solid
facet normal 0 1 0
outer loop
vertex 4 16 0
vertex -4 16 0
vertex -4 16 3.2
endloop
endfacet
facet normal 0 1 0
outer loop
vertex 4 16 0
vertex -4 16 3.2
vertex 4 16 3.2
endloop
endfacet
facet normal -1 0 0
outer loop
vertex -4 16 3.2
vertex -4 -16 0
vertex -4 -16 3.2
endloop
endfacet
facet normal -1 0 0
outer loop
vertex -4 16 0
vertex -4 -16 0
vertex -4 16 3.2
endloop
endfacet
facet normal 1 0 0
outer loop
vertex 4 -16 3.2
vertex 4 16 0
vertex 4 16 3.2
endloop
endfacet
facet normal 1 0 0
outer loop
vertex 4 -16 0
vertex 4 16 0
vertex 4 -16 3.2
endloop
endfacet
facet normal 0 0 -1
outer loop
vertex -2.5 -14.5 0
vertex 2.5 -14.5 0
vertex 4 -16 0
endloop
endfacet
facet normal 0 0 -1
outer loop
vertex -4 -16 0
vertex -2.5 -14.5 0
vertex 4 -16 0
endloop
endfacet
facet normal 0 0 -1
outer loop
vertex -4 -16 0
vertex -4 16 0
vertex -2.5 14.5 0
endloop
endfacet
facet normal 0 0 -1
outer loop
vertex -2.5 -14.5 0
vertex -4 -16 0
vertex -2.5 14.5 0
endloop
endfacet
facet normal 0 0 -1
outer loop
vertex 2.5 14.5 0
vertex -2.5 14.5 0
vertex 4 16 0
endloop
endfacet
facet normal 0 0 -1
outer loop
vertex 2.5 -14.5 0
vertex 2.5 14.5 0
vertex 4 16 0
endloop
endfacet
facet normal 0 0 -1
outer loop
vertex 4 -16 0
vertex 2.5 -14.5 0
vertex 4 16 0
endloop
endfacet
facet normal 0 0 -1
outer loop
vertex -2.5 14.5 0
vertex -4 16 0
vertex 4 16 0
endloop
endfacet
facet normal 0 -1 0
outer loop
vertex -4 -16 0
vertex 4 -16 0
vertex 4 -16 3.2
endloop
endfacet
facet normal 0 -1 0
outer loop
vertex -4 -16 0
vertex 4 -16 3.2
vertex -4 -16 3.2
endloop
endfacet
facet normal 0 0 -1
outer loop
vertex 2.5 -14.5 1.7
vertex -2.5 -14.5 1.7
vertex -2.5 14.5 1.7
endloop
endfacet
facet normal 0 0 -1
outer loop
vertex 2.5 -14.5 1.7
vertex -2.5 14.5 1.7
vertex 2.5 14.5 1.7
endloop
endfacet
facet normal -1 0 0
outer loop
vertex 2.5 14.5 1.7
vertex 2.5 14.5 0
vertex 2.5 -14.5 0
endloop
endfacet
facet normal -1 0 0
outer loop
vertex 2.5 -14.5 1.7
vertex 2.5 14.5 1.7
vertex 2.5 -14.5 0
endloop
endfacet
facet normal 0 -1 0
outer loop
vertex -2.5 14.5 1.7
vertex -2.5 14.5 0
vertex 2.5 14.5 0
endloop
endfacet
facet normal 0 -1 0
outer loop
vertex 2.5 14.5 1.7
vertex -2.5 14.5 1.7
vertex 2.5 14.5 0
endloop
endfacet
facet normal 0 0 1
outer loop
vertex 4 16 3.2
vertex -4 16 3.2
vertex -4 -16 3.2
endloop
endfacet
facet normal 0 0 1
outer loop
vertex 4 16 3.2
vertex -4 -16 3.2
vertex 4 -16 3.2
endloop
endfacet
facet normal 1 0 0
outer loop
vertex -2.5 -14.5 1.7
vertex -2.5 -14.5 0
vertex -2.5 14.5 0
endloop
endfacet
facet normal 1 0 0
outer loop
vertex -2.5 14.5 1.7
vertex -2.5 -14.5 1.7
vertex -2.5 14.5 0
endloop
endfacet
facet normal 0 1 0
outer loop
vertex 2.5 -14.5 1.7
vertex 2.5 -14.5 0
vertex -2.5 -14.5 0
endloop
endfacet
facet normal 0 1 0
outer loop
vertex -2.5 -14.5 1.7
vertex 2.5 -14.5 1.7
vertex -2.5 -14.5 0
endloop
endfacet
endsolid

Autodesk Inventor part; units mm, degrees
ref_plane "YZ Plane" through (0, 0, 0) normal (1, 0, 0) x (0, 1, 0)
ref_plane "XZ Plane" through (0, 0, 0) normal (0, 1, 0) x (-1, 0, 0)
ref_plane "XY Plane" through (0, 0, 0) normal (0, 0, 1) x (1, 0, 0)
sketch "Sketch1" plane through (0, 0, 0) normal (0, 0, 1) x (1, 0, 0)
  line L0 (-4, 16) -> (4, 16)
  line L1 (4, 16) -> (4, -16)
  line L2 (4, -16) -> (-4, -16)
  line L3 (-4, -16) -> (-4, 16)
  point P0 (0, 0)
  dimension "d0" = 8
  dimension "d1" = 32
  dimension "d2" = 4
  dimension "d3" = 16
extrude "Extrusion1" add sketch "Sketch1" along normal blind 3.2
shell "Shell1" thickness 1.5 removed faces 1 at (1.3333, 5.3333, 0)
sketch "Sketch2" plane through (0, 0, 3.2) normal (0, 0, 1) x (1, 0, 0)
  circle A0 centre (0, -12) radius 2.5
  line L0 (4, 16) -> (4, -16) projected
  line L1 (4, -16) -> (-4, -16) projected
  dimension "d7" = 5
  dimension "d10" = 4
  dimension "d11" = 4
extrude "Extrusion2" [suppressed]
sketch "Sketch3" plane through (2.5, -14.5, 1.7) normal (0, 0, -1) x (-1, 0, 0)
  circle A0 centre (2.5, 2.5) radius 1.2
  point P0 (2.5, 14.5)
  dimension "d18" = 2.4
extrude "Extrusion3" [suppressed]
pattern_linear "Rectangular Pattern1" [suppressed]
sketch "Sketch4" plane through (2.5, -14.5, 1.7) normal (0, 0, -1) x (-1, 0, 0)
  line L0 (0, 29) -> (0, 0) projected
  line L1 (0, 0) -> (5, 0) projected
  circle A0 centre (6.5, 6.5) radius 3.15
  circle A1 centre (6.5, 6.5) radius 2.5
  point P0 (2.5, 14.5)
  dimension "d21" = 6.5
  dimension "d22" = 6.5
  dimension "d25" = 5
  dimension "d26" = 6.3
extrude "Extrusion4" [suppressed]
pattern_linear "Rectangular Pattern2" [suppressed]
equation "\"d0\" = 8 * WIDTH"
equation "\"d1\" = 8 * LENGTH"
equation "\"d2\" = 0.5 * d0"
equation "\"d3\" = 0.5 * d1"
equation "\"d4\" = HEIGHT"
equation "\"d21\" = 0.5 * d23 + 0.5 * d24"
equation "\"d22\" = d21"
equation "\"WIDTH\" = 1"
equation "\"HEIGHT\" = 3.2"
equation "\"LENGTH\" = 4"
equation "\"d23\" = 10.5"
equation "\"d24\" = 2.5"
properties part number "2431" material "Steel"
